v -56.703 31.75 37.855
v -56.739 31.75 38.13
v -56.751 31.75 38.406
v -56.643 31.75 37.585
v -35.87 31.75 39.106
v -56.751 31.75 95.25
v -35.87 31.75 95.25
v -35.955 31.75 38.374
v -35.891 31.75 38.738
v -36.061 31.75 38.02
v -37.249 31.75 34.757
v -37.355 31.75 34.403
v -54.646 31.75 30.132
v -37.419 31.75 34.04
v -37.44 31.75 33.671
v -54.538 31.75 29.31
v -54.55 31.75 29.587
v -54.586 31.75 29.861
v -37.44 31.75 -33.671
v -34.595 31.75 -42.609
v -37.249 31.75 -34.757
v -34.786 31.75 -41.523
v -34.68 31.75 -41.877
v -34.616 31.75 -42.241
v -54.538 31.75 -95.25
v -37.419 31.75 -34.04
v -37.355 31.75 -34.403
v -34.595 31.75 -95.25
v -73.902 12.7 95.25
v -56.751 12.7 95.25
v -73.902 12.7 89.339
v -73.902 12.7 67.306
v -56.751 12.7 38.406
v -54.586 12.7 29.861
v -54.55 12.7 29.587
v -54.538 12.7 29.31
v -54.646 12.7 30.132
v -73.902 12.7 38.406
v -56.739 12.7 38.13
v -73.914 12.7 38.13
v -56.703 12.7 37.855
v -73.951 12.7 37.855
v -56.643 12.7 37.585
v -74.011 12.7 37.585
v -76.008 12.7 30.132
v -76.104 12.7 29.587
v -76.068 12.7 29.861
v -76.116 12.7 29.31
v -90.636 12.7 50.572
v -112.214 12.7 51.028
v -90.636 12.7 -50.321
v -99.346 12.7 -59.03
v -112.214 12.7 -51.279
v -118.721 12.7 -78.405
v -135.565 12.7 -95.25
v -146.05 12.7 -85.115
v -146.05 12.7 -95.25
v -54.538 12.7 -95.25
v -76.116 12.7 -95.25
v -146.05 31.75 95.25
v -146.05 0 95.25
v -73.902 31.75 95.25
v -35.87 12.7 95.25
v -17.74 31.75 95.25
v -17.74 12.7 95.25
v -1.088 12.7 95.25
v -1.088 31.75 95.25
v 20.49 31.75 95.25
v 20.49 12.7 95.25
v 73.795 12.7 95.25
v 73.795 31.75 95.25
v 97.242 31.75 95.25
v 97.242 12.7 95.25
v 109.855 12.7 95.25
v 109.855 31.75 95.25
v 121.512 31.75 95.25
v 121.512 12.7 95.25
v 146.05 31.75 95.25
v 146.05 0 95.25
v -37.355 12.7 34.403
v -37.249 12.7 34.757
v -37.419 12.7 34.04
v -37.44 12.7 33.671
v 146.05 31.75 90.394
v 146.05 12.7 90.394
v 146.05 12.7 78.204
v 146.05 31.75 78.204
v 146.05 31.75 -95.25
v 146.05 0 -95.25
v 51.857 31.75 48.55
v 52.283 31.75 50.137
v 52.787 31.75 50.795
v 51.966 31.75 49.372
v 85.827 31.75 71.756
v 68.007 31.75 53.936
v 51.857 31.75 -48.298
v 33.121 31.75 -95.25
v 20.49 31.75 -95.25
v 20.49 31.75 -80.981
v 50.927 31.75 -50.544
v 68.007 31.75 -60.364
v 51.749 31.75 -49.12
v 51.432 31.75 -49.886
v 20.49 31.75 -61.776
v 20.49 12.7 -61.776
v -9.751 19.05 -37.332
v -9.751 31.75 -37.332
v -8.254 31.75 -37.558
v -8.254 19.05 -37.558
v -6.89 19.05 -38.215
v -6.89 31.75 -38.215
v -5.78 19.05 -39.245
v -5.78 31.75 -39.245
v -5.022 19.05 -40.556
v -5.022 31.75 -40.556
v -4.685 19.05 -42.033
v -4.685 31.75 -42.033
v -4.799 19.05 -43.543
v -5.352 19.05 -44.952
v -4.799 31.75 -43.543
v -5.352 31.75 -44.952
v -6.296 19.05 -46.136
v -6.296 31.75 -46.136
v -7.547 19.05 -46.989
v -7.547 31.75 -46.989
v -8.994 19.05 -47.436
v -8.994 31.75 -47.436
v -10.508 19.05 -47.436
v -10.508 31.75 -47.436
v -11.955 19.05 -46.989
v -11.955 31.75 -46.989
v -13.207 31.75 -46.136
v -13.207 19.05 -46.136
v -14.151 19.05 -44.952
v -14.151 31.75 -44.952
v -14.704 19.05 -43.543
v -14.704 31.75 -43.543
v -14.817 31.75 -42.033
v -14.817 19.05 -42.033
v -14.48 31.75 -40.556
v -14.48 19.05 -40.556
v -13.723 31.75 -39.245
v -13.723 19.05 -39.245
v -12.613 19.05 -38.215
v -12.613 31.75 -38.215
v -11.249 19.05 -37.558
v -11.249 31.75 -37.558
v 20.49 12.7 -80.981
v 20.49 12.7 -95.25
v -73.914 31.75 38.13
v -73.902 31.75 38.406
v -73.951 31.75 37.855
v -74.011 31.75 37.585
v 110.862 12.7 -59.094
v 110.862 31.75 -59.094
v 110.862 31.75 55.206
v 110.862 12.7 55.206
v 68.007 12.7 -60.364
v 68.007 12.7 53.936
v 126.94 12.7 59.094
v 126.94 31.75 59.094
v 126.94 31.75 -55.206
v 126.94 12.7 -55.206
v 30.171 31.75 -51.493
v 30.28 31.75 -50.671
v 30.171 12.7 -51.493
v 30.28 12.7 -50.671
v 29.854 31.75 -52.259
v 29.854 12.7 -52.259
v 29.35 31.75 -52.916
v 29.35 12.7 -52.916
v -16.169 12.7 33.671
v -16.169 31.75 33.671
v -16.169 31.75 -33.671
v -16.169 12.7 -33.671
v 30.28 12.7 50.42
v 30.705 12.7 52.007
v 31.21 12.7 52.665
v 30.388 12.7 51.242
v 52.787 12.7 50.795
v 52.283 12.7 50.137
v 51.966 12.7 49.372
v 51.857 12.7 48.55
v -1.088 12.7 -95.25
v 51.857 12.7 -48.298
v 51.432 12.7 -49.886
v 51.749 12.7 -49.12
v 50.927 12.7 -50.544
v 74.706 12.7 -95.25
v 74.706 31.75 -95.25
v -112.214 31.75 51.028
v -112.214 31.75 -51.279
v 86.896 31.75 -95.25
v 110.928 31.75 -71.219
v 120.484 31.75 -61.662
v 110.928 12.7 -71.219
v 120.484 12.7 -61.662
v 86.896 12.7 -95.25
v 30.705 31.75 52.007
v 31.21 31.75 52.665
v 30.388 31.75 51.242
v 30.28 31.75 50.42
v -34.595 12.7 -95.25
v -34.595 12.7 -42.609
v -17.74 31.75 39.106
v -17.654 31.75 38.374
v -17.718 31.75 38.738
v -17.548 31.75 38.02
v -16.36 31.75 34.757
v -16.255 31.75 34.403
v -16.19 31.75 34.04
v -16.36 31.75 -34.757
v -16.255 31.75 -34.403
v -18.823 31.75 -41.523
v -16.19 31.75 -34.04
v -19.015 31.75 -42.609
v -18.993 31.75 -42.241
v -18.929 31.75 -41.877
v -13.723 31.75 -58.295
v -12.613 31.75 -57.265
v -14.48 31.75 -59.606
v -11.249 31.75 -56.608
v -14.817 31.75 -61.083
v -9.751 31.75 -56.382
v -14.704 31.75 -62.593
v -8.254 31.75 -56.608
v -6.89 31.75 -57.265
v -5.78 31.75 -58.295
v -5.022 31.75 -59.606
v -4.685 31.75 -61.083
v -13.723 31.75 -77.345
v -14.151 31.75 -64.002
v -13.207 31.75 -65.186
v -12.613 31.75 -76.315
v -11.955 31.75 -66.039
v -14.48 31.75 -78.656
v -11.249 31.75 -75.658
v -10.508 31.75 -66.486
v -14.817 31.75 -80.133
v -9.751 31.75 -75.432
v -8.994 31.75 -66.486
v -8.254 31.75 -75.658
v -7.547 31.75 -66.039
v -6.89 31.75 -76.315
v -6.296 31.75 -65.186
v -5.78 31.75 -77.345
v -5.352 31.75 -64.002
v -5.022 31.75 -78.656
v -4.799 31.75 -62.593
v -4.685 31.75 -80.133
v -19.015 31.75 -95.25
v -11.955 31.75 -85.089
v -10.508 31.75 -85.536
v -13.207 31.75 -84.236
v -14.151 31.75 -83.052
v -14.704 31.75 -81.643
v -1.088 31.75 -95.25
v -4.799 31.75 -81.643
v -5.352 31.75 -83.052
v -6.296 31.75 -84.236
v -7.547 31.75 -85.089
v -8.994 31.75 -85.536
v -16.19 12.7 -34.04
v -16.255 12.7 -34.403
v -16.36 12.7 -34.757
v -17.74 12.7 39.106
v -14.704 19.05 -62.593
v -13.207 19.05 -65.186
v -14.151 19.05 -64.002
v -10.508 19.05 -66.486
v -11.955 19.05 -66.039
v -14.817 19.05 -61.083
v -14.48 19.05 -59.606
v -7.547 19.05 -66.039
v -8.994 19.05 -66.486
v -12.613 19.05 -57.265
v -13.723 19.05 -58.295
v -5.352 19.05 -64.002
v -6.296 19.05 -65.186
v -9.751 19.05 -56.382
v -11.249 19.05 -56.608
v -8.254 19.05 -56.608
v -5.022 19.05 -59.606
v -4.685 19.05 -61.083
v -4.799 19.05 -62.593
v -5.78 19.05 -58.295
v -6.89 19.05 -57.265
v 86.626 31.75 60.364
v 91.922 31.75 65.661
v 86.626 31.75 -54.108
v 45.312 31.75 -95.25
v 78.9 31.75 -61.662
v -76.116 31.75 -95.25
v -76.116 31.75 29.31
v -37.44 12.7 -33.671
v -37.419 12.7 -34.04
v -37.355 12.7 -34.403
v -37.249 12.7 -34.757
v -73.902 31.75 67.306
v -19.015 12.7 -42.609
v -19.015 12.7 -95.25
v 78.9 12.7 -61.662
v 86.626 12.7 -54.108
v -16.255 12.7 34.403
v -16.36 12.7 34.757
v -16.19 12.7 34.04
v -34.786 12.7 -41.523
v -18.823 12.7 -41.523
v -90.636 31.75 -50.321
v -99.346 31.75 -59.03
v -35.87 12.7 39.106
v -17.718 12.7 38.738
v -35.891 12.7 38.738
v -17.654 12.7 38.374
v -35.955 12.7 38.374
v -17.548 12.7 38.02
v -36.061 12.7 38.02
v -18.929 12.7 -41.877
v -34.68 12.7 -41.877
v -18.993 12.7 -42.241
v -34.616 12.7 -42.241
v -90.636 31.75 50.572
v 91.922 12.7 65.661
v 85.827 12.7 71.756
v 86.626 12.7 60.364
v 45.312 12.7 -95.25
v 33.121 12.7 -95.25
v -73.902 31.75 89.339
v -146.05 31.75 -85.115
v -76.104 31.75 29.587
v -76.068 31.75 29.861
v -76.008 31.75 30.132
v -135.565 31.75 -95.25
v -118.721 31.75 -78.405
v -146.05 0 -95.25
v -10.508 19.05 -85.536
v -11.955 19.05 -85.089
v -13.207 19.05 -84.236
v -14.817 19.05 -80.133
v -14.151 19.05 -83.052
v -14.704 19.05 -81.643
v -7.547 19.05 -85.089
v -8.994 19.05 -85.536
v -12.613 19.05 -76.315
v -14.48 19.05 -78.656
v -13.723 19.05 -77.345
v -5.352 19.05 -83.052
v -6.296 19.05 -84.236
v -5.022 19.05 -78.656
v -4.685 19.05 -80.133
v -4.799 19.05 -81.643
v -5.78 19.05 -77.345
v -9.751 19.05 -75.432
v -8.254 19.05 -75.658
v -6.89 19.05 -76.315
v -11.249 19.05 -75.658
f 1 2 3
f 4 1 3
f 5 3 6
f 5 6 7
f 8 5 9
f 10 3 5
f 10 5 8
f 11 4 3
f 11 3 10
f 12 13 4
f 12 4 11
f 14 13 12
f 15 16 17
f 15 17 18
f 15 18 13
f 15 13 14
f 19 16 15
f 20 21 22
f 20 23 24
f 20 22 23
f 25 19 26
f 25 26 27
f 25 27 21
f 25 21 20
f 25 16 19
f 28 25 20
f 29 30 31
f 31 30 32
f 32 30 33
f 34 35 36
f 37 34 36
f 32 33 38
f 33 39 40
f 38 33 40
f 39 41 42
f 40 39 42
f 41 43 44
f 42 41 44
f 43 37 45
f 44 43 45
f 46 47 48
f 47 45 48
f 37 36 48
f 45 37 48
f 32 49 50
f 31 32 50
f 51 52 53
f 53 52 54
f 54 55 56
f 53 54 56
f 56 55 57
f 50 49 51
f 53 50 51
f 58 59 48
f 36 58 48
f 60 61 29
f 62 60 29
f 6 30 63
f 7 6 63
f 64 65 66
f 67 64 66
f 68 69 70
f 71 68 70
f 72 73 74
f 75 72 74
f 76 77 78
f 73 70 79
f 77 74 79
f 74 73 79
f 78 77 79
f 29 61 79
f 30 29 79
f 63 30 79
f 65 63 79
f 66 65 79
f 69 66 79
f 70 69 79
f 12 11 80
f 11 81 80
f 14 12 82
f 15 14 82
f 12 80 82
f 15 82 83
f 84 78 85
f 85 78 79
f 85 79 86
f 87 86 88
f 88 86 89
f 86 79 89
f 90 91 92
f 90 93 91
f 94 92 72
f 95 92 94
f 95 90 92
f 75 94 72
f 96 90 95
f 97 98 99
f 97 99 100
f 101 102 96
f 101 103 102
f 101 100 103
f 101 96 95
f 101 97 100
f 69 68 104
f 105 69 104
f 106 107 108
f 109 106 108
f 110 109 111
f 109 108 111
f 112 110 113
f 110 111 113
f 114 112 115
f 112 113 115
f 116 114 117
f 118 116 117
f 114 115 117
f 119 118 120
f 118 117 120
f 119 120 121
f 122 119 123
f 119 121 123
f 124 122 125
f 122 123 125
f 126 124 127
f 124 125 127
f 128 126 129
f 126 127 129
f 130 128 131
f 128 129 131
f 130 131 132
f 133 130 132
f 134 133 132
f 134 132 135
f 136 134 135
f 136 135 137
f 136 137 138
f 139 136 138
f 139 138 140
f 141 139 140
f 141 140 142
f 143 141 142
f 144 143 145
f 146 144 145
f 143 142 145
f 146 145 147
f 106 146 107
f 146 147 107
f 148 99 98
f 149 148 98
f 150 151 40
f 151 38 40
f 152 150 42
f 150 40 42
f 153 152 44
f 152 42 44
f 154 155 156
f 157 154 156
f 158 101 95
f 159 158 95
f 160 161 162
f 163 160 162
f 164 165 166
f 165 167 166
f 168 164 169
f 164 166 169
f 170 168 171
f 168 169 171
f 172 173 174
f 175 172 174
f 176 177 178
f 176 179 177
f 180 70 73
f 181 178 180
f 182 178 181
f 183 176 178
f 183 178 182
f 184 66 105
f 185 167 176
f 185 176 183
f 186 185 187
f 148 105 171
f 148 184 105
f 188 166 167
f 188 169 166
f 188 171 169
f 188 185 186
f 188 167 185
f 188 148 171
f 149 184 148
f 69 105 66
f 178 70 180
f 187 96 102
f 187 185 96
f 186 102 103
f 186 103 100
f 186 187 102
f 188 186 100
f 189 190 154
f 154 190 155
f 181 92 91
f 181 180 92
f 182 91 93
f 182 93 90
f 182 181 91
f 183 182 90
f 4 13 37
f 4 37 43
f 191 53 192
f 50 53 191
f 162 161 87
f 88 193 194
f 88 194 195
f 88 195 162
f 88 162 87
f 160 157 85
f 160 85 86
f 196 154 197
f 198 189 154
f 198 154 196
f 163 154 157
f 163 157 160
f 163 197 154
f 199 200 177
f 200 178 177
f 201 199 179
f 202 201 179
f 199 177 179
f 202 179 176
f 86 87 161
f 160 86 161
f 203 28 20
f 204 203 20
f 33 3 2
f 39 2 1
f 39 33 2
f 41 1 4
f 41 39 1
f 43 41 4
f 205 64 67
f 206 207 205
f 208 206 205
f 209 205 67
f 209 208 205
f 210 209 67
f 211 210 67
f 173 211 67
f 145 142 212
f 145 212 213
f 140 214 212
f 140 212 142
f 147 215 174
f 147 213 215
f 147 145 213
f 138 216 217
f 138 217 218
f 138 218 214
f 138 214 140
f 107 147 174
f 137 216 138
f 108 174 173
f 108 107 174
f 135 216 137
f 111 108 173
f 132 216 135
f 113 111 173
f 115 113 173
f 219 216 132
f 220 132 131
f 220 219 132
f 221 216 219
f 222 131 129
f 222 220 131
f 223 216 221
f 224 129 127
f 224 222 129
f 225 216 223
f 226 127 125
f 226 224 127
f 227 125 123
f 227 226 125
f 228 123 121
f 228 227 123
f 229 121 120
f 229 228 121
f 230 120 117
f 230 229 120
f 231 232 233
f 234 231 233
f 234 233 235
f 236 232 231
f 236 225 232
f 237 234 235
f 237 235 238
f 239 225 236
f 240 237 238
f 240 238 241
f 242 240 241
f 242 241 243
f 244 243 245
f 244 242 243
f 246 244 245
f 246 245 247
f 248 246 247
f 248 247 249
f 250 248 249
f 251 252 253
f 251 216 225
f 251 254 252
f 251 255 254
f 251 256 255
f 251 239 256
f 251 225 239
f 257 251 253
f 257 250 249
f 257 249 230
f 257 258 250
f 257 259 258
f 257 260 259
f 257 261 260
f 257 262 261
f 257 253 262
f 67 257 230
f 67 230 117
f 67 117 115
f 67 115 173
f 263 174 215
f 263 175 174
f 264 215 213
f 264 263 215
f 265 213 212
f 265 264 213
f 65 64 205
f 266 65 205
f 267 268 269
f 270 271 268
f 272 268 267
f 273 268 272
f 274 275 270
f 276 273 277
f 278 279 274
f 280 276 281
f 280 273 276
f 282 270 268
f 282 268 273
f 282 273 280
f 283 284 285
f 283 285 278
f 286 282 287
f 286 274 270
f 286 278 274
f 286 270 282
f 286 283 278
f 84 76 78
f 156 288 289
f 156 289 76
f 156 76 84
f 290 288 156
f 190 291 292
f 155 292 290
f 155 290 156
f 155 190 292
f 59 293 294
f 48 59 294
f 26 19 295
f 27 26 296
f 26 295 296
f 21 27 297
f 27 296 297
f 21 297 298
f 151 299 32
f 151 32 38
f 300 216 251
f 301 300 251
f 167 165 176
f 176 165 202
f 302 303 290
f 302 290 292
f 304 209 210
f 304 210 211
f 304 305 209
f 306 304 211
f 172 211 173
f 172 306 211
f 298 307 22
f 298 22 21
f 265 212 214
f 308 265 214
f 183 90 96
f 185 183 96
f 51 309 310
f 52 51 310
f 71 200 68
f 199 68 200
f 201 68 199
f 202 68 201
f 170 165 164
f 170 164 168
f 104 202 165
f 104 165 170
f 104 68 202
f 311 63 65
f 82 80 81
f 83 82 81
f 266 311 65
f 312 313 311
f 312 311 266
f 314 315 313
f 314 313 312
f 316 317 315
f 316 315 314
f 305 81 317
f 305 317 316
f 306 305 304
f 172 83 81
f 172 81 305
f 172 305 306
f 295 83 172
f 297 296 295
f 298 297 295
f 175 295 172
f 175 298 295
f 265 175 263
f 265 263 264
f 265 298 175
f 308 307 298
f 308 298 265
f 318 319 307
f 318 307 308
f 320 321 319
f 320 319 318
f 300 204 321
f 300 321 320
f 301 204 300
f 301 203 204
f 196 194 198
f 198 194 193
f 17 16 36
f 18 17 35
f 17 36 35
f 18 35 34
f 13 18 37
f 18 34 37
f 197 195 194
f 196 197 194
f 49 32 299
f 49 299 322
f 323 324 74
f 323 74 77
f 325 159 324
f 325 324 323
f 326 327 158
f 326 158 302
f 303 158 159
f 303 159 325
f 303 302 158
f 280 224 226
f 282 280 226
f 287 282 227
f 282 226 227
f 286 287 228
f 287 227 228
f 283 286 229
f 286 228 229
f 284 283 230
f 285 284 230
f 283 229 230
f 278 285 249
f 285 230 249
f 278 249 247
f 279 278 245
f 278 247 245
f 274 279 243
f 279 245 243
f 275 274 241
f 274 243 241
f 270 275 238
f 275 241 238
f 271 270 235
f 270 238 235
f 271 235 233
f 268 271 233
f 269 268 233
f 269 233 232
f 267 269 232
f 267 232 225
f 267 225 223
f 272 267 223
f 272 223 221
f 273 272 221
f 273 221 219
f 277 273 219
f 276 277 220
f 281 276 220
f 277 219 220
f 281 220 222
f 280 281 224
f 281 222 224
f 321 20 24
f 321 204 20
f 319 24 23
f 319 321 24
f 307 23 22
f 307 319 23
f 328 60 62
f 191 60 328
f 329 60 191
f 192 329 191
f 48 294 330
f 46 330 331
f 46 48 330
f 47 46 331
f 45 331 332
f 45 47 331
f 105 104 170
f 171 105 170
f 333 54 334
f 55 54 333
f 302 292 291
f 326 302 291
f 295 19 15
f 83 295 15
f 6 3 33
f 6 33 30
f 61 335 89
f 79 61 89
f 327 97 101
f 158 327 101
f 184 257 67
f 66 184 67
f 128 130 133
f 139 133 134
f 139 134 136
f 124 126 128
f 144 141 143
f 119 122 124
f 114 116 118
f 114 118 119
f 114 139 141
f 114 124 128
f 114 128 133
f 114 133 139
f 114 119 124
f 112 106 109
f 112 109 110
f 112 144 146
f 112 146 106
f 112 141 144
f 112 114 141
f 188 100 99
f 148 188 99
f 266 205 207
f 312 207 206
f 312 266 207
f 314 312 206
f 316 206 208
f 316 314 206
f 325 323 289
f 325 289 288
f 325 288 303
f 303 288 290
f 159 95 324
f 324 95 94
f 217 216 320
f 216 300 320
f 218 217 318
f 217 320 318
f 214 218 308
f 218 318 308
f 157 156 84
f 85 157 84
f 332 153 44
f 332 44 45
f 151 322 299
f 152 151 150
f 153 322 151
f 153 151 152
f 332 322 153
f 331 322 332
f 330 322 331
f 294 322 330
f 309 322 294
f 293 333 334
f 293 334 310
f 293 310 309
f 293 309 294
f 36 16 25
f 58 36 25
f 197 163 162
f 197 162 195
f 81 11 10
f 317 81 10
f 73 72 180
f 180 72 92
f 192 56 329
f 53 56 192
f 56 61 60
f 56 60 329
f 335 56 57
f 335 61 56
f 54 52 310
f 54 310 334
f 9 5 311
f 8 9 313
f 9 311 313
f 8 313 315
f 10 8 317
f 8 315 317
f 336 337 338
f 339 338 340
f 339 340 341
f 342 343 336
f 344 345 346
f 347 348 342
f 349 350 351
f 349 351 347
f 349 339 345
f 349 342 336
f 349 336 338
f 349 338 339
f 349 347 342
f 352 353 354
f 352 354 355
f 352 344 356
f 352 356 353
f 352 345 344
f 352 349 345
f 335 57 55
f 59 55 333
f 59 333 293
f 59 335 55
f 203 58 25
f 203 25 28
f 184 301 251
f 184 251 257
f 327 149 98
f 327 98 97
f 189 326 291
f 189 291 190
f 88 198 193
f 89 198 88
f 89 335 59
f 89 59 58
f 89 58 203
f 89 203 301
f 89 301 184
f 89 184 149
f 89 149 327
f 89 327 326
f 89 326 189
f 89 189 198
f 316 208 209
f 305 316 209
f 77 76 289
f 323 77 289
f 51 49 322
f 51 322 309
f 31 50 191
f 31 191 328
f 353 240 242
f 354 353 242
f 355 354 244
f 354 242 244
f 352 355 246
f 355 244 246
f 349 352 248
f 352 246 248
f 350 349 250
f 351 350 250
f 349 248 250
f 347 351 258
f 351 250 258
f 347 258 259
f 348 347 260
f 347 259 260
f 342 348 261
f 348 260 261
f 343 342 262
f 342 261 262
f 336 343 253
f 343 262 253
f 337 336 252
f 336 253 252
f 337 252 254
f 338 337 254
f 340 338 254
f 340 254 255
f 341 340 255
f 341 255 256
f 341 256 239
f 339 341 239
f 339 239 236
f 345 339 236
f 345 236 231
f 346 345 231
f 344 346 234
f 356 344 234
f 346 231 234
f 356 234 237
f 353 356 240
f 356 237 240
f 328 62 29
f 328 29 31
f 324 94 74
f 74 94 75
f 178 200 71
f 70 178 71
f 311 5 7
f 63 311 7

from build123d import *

# Parameters (mm, degrees)
SKETCH1_W           = 292.1
SKETCH1_H           = 190.5
BOSS_EXTRUDE1_DEPTH = 31.75
CUT_EXTRUDE1_DEPTH  = 19.05
FILLET1_R           = 3.175
SKETCH8_R           = 5.08
CUT_EXTRUDE2_DEPTH  = 12.7
CUT_EXTRUDE3_DEPTH  = 19.05
CUT_EXTRUDE4_START  = -19.05
CUT_EXTRUDE4_DEPTH  = 19.05


with BuildPart() as part:
    # Sketch1 → Boss-Extrude1 (new body)
    with BuildSketch(Plane(origin=(0, 0, 0), x_dir=(1, 0, 0), z_dir=(0, 1, 0))):
        Rectangle(SKETCH1_W, SKETCH1_H)
    extrude(amount=BOSS_EXTRUDE1_DEPTH)

    # Sketch5 → Cut-Extrude1 (cut)
    with BuildSketch(Plane(origin=(0, 31.75, 0), x_dir=(1, 0, 0), z_dir=(0, 1, 0))):
        Polygon((-54.537973011, 56.645897063), (-54.537973011, 45.282587268), (-54.537973011, -9.143020761), (-54.537973011, -29.727810076), (-56.751368127, -37.988313106), (-56.751368127, -113.256317169), (-73.902361837, -113.256317169), (-73.902361837, -37.988313106), (-76.115756953, -29.727810076), (-76.115756953, -11.930912732), (-76.115756953, -9.143020761), (-76.115756953, 45.282587268), (-76.115756953, 56.645897063), (-76.115756953, 64.900897063), (-76.115756953, 123.938542293), (-54.537973011, 123.938542293), (-54.537973011, 64.900897063), align=None)
        Polygon((-35.869641097, -54.76875), (-35.869641097, -113.256317169), (-17.739641097, -113.256317169), (-17.739641097, -54.76875), (-17.739641097, -38.54651566), (-16.168929869, -34.231022029), (-16.168929869, 34.231022029), (-19.014641097, 42.04954937), (-19.014641097, 54.76875), (-19.014641097, 123.938542293), (-34.594641097, 123.938542293), (-34.594641097, 54.76875), (-34.594641097, 42.04954937), (-37.440352325, 34.231022029), (-37.440352325, -34.231022029), (-35.869641097, -38.54651566), align=None)
        Polygon((68.007088005, -12.827), (68.007088005, -53.93599914), (75.733185186, -61.662096321), (85.826970956, -71.755882091), (120.911645373, -106.060842413), (128.794129656, -102.532519884), (91.922231409, -65.660621637), (86.625610633, -60.36400086), (86.625610633, -12.827), (86.625610633, 12.827), (86.625610633, 54.107702226), (78.899513451, 61.662096321), (69.164333129, 71.397276643), (30.279619459, 110.281990313), (23.687738087, 104.683350778), (63.069072676, 65.302016189), (68.007088005, 60.36400086), (68.007088005, 12.827), align=None)
        Polygon((20.489996677, 80.981024842), (20.489996677, 107.787781329), (-1.087787265, 107.787781329), (-1.087787265, 37.36975), (-1.087787265, -17.055858029), (-1.087787265, -113.256317169), (20.489996677, -113.256317169), (20.489996677, -17.055858029), (20.489996677, 37.36975), (20.489996677, 61.776004665), (30.279619459, 51.986381883), (30.279619459, -51.734938461), (111.842171541, -133.297490543), (131.611931441, -129.619589579), (51.857403402, -49.865061539), (51.857403402, 49.613618117), align=None)
    extrude(amount=-CUT_EXTRUDE1_DEPTH, mode=Mode.SUBTRACT)

    # Fillet1
    fillet1_edges = [part.edges().sort_by_distance(p)[0] for p in [
        (-34.594641097, 22.225, -42.04954937),
        (-17.739641097, 22.225, 38.54651566),
        (-37.440352325, 22.225, 34.231022029),
        (-37.440352325, 22.225, -34.231022029),
        (-19.014641097, 22.225, -42.04954937),
        (-16.168929869, 22.225, -34.231022029),
        (-16.168929869, 22.225, 34.231022029),
        (-35.869641097, 22.225, 38.54651566),
        (51.857403402, 22.225, 49.865061539),
        (51.857403402, 22.225, -49.613618117),
        (30.279619459, 22.225, 51.734938461),
        (30.279619459, 22.225, -51.986381883),
        (-76.115756953, 22.225, 29.727810076),
        (-56.751368127, 22.225, 37.988313106),
        (-73.902361837, 22.225, 37.988313106),
        (-54.537973011, 22.225, 29.727810076),
    ]]
    fillet(fillet1_edges, radius=FILLET1_R)

    # Sketch8 → Cut-Extrude2 (cut)
    with BuildSketch(Plane(origin=(0, 31.75, 0), x_dir=(1, 0, 0), z_dir=(0, 1, 0))):
        with Locations(Location((-9.751260883, 42.41224903, 0), (0, 0, 270))):
            Circle(SKETCH8_R)
        with Locations(Location((-9.751260883, 61.46224903, 0), (0, 0, 270))):
            Circle(SKETCH8_R)
        with Locations(Location((-9.751260883, 80.51224903, 0), (0, 0, 270))):
            Circle(SKETCH8_R)
    extrude(amount=-CUT_EXTRUDE2_DEPTH, mode=Mode.SUBTRACT)

    # Sketch10 → Cut-Extrude3 (cut)
    with BuildSketch(Plane(origin=(0, 31.75, 0), x_dir=(1, 0, 0), z_dir=(0, 1, 0))):
        Polygon((110.861963616, 12.827), (110.861963616, -12.827), (110.861963616, -55.20599914), (117.318060797, -61.662096321), (127.591928077, -71.935963601), (167.375411749, -111.719447273), (167.375411749, -99.528926365), (133.687188531, -65.840703147), (126.940486244, -59.09400086), (126.940486244, -12.827), (126.940486244, 12.827), (126.940486244, 55.20599914), (120.484389062, 61.662096321), (110.927960718, 71.218524666), (71.315632765, 110.830852619), (59.125111857, 110.830852619), (104.832700264, 65.123264212), (110.861963616, 59.09400086), align=None)
    extrude(amount=-CUT_EXTRUDE3_DEPTH, mode=Mode.SUBTRACT)

    # Sketch13 → Cut-Extrude4 (cut)
    with BuildSketch(Plane(origin=(0, 31.75, 0), x_dir=(1, 0, 0), z_dir=(0, 1, 0)).offset(CUT_EXTRUDE4_START)):
        Polygon((-90.636160304, -19.2405), (-90.636160304, 19.2405), (-90.636160304, 50.320724899), (-99.345622638, 59.030187232), (-118.720884143, 78.405448738), (-162.613070171, 122.297634766), (-162.613070171, 101.678401026), (-129.030501013, 68.095831868), (-112.213944246, 51.279275101), (-112.213944246, 19.2405), (-112.213944246, -19.2405), (-112.213944246, -51.02783168), (-103.858035303, -59.383740623), (-84.482773798, -78.759002128), (-70.58319311, -92.658582816), (-70.58319311, -70.625135514), (-73.466050147, -67.742278477), (-90.636160304, -50.57216832), align=None)
    extrude(amount=CUT_EXTRUDE4_DEPTH, mode=Mode.SUBTRACT)


solid = part.part
